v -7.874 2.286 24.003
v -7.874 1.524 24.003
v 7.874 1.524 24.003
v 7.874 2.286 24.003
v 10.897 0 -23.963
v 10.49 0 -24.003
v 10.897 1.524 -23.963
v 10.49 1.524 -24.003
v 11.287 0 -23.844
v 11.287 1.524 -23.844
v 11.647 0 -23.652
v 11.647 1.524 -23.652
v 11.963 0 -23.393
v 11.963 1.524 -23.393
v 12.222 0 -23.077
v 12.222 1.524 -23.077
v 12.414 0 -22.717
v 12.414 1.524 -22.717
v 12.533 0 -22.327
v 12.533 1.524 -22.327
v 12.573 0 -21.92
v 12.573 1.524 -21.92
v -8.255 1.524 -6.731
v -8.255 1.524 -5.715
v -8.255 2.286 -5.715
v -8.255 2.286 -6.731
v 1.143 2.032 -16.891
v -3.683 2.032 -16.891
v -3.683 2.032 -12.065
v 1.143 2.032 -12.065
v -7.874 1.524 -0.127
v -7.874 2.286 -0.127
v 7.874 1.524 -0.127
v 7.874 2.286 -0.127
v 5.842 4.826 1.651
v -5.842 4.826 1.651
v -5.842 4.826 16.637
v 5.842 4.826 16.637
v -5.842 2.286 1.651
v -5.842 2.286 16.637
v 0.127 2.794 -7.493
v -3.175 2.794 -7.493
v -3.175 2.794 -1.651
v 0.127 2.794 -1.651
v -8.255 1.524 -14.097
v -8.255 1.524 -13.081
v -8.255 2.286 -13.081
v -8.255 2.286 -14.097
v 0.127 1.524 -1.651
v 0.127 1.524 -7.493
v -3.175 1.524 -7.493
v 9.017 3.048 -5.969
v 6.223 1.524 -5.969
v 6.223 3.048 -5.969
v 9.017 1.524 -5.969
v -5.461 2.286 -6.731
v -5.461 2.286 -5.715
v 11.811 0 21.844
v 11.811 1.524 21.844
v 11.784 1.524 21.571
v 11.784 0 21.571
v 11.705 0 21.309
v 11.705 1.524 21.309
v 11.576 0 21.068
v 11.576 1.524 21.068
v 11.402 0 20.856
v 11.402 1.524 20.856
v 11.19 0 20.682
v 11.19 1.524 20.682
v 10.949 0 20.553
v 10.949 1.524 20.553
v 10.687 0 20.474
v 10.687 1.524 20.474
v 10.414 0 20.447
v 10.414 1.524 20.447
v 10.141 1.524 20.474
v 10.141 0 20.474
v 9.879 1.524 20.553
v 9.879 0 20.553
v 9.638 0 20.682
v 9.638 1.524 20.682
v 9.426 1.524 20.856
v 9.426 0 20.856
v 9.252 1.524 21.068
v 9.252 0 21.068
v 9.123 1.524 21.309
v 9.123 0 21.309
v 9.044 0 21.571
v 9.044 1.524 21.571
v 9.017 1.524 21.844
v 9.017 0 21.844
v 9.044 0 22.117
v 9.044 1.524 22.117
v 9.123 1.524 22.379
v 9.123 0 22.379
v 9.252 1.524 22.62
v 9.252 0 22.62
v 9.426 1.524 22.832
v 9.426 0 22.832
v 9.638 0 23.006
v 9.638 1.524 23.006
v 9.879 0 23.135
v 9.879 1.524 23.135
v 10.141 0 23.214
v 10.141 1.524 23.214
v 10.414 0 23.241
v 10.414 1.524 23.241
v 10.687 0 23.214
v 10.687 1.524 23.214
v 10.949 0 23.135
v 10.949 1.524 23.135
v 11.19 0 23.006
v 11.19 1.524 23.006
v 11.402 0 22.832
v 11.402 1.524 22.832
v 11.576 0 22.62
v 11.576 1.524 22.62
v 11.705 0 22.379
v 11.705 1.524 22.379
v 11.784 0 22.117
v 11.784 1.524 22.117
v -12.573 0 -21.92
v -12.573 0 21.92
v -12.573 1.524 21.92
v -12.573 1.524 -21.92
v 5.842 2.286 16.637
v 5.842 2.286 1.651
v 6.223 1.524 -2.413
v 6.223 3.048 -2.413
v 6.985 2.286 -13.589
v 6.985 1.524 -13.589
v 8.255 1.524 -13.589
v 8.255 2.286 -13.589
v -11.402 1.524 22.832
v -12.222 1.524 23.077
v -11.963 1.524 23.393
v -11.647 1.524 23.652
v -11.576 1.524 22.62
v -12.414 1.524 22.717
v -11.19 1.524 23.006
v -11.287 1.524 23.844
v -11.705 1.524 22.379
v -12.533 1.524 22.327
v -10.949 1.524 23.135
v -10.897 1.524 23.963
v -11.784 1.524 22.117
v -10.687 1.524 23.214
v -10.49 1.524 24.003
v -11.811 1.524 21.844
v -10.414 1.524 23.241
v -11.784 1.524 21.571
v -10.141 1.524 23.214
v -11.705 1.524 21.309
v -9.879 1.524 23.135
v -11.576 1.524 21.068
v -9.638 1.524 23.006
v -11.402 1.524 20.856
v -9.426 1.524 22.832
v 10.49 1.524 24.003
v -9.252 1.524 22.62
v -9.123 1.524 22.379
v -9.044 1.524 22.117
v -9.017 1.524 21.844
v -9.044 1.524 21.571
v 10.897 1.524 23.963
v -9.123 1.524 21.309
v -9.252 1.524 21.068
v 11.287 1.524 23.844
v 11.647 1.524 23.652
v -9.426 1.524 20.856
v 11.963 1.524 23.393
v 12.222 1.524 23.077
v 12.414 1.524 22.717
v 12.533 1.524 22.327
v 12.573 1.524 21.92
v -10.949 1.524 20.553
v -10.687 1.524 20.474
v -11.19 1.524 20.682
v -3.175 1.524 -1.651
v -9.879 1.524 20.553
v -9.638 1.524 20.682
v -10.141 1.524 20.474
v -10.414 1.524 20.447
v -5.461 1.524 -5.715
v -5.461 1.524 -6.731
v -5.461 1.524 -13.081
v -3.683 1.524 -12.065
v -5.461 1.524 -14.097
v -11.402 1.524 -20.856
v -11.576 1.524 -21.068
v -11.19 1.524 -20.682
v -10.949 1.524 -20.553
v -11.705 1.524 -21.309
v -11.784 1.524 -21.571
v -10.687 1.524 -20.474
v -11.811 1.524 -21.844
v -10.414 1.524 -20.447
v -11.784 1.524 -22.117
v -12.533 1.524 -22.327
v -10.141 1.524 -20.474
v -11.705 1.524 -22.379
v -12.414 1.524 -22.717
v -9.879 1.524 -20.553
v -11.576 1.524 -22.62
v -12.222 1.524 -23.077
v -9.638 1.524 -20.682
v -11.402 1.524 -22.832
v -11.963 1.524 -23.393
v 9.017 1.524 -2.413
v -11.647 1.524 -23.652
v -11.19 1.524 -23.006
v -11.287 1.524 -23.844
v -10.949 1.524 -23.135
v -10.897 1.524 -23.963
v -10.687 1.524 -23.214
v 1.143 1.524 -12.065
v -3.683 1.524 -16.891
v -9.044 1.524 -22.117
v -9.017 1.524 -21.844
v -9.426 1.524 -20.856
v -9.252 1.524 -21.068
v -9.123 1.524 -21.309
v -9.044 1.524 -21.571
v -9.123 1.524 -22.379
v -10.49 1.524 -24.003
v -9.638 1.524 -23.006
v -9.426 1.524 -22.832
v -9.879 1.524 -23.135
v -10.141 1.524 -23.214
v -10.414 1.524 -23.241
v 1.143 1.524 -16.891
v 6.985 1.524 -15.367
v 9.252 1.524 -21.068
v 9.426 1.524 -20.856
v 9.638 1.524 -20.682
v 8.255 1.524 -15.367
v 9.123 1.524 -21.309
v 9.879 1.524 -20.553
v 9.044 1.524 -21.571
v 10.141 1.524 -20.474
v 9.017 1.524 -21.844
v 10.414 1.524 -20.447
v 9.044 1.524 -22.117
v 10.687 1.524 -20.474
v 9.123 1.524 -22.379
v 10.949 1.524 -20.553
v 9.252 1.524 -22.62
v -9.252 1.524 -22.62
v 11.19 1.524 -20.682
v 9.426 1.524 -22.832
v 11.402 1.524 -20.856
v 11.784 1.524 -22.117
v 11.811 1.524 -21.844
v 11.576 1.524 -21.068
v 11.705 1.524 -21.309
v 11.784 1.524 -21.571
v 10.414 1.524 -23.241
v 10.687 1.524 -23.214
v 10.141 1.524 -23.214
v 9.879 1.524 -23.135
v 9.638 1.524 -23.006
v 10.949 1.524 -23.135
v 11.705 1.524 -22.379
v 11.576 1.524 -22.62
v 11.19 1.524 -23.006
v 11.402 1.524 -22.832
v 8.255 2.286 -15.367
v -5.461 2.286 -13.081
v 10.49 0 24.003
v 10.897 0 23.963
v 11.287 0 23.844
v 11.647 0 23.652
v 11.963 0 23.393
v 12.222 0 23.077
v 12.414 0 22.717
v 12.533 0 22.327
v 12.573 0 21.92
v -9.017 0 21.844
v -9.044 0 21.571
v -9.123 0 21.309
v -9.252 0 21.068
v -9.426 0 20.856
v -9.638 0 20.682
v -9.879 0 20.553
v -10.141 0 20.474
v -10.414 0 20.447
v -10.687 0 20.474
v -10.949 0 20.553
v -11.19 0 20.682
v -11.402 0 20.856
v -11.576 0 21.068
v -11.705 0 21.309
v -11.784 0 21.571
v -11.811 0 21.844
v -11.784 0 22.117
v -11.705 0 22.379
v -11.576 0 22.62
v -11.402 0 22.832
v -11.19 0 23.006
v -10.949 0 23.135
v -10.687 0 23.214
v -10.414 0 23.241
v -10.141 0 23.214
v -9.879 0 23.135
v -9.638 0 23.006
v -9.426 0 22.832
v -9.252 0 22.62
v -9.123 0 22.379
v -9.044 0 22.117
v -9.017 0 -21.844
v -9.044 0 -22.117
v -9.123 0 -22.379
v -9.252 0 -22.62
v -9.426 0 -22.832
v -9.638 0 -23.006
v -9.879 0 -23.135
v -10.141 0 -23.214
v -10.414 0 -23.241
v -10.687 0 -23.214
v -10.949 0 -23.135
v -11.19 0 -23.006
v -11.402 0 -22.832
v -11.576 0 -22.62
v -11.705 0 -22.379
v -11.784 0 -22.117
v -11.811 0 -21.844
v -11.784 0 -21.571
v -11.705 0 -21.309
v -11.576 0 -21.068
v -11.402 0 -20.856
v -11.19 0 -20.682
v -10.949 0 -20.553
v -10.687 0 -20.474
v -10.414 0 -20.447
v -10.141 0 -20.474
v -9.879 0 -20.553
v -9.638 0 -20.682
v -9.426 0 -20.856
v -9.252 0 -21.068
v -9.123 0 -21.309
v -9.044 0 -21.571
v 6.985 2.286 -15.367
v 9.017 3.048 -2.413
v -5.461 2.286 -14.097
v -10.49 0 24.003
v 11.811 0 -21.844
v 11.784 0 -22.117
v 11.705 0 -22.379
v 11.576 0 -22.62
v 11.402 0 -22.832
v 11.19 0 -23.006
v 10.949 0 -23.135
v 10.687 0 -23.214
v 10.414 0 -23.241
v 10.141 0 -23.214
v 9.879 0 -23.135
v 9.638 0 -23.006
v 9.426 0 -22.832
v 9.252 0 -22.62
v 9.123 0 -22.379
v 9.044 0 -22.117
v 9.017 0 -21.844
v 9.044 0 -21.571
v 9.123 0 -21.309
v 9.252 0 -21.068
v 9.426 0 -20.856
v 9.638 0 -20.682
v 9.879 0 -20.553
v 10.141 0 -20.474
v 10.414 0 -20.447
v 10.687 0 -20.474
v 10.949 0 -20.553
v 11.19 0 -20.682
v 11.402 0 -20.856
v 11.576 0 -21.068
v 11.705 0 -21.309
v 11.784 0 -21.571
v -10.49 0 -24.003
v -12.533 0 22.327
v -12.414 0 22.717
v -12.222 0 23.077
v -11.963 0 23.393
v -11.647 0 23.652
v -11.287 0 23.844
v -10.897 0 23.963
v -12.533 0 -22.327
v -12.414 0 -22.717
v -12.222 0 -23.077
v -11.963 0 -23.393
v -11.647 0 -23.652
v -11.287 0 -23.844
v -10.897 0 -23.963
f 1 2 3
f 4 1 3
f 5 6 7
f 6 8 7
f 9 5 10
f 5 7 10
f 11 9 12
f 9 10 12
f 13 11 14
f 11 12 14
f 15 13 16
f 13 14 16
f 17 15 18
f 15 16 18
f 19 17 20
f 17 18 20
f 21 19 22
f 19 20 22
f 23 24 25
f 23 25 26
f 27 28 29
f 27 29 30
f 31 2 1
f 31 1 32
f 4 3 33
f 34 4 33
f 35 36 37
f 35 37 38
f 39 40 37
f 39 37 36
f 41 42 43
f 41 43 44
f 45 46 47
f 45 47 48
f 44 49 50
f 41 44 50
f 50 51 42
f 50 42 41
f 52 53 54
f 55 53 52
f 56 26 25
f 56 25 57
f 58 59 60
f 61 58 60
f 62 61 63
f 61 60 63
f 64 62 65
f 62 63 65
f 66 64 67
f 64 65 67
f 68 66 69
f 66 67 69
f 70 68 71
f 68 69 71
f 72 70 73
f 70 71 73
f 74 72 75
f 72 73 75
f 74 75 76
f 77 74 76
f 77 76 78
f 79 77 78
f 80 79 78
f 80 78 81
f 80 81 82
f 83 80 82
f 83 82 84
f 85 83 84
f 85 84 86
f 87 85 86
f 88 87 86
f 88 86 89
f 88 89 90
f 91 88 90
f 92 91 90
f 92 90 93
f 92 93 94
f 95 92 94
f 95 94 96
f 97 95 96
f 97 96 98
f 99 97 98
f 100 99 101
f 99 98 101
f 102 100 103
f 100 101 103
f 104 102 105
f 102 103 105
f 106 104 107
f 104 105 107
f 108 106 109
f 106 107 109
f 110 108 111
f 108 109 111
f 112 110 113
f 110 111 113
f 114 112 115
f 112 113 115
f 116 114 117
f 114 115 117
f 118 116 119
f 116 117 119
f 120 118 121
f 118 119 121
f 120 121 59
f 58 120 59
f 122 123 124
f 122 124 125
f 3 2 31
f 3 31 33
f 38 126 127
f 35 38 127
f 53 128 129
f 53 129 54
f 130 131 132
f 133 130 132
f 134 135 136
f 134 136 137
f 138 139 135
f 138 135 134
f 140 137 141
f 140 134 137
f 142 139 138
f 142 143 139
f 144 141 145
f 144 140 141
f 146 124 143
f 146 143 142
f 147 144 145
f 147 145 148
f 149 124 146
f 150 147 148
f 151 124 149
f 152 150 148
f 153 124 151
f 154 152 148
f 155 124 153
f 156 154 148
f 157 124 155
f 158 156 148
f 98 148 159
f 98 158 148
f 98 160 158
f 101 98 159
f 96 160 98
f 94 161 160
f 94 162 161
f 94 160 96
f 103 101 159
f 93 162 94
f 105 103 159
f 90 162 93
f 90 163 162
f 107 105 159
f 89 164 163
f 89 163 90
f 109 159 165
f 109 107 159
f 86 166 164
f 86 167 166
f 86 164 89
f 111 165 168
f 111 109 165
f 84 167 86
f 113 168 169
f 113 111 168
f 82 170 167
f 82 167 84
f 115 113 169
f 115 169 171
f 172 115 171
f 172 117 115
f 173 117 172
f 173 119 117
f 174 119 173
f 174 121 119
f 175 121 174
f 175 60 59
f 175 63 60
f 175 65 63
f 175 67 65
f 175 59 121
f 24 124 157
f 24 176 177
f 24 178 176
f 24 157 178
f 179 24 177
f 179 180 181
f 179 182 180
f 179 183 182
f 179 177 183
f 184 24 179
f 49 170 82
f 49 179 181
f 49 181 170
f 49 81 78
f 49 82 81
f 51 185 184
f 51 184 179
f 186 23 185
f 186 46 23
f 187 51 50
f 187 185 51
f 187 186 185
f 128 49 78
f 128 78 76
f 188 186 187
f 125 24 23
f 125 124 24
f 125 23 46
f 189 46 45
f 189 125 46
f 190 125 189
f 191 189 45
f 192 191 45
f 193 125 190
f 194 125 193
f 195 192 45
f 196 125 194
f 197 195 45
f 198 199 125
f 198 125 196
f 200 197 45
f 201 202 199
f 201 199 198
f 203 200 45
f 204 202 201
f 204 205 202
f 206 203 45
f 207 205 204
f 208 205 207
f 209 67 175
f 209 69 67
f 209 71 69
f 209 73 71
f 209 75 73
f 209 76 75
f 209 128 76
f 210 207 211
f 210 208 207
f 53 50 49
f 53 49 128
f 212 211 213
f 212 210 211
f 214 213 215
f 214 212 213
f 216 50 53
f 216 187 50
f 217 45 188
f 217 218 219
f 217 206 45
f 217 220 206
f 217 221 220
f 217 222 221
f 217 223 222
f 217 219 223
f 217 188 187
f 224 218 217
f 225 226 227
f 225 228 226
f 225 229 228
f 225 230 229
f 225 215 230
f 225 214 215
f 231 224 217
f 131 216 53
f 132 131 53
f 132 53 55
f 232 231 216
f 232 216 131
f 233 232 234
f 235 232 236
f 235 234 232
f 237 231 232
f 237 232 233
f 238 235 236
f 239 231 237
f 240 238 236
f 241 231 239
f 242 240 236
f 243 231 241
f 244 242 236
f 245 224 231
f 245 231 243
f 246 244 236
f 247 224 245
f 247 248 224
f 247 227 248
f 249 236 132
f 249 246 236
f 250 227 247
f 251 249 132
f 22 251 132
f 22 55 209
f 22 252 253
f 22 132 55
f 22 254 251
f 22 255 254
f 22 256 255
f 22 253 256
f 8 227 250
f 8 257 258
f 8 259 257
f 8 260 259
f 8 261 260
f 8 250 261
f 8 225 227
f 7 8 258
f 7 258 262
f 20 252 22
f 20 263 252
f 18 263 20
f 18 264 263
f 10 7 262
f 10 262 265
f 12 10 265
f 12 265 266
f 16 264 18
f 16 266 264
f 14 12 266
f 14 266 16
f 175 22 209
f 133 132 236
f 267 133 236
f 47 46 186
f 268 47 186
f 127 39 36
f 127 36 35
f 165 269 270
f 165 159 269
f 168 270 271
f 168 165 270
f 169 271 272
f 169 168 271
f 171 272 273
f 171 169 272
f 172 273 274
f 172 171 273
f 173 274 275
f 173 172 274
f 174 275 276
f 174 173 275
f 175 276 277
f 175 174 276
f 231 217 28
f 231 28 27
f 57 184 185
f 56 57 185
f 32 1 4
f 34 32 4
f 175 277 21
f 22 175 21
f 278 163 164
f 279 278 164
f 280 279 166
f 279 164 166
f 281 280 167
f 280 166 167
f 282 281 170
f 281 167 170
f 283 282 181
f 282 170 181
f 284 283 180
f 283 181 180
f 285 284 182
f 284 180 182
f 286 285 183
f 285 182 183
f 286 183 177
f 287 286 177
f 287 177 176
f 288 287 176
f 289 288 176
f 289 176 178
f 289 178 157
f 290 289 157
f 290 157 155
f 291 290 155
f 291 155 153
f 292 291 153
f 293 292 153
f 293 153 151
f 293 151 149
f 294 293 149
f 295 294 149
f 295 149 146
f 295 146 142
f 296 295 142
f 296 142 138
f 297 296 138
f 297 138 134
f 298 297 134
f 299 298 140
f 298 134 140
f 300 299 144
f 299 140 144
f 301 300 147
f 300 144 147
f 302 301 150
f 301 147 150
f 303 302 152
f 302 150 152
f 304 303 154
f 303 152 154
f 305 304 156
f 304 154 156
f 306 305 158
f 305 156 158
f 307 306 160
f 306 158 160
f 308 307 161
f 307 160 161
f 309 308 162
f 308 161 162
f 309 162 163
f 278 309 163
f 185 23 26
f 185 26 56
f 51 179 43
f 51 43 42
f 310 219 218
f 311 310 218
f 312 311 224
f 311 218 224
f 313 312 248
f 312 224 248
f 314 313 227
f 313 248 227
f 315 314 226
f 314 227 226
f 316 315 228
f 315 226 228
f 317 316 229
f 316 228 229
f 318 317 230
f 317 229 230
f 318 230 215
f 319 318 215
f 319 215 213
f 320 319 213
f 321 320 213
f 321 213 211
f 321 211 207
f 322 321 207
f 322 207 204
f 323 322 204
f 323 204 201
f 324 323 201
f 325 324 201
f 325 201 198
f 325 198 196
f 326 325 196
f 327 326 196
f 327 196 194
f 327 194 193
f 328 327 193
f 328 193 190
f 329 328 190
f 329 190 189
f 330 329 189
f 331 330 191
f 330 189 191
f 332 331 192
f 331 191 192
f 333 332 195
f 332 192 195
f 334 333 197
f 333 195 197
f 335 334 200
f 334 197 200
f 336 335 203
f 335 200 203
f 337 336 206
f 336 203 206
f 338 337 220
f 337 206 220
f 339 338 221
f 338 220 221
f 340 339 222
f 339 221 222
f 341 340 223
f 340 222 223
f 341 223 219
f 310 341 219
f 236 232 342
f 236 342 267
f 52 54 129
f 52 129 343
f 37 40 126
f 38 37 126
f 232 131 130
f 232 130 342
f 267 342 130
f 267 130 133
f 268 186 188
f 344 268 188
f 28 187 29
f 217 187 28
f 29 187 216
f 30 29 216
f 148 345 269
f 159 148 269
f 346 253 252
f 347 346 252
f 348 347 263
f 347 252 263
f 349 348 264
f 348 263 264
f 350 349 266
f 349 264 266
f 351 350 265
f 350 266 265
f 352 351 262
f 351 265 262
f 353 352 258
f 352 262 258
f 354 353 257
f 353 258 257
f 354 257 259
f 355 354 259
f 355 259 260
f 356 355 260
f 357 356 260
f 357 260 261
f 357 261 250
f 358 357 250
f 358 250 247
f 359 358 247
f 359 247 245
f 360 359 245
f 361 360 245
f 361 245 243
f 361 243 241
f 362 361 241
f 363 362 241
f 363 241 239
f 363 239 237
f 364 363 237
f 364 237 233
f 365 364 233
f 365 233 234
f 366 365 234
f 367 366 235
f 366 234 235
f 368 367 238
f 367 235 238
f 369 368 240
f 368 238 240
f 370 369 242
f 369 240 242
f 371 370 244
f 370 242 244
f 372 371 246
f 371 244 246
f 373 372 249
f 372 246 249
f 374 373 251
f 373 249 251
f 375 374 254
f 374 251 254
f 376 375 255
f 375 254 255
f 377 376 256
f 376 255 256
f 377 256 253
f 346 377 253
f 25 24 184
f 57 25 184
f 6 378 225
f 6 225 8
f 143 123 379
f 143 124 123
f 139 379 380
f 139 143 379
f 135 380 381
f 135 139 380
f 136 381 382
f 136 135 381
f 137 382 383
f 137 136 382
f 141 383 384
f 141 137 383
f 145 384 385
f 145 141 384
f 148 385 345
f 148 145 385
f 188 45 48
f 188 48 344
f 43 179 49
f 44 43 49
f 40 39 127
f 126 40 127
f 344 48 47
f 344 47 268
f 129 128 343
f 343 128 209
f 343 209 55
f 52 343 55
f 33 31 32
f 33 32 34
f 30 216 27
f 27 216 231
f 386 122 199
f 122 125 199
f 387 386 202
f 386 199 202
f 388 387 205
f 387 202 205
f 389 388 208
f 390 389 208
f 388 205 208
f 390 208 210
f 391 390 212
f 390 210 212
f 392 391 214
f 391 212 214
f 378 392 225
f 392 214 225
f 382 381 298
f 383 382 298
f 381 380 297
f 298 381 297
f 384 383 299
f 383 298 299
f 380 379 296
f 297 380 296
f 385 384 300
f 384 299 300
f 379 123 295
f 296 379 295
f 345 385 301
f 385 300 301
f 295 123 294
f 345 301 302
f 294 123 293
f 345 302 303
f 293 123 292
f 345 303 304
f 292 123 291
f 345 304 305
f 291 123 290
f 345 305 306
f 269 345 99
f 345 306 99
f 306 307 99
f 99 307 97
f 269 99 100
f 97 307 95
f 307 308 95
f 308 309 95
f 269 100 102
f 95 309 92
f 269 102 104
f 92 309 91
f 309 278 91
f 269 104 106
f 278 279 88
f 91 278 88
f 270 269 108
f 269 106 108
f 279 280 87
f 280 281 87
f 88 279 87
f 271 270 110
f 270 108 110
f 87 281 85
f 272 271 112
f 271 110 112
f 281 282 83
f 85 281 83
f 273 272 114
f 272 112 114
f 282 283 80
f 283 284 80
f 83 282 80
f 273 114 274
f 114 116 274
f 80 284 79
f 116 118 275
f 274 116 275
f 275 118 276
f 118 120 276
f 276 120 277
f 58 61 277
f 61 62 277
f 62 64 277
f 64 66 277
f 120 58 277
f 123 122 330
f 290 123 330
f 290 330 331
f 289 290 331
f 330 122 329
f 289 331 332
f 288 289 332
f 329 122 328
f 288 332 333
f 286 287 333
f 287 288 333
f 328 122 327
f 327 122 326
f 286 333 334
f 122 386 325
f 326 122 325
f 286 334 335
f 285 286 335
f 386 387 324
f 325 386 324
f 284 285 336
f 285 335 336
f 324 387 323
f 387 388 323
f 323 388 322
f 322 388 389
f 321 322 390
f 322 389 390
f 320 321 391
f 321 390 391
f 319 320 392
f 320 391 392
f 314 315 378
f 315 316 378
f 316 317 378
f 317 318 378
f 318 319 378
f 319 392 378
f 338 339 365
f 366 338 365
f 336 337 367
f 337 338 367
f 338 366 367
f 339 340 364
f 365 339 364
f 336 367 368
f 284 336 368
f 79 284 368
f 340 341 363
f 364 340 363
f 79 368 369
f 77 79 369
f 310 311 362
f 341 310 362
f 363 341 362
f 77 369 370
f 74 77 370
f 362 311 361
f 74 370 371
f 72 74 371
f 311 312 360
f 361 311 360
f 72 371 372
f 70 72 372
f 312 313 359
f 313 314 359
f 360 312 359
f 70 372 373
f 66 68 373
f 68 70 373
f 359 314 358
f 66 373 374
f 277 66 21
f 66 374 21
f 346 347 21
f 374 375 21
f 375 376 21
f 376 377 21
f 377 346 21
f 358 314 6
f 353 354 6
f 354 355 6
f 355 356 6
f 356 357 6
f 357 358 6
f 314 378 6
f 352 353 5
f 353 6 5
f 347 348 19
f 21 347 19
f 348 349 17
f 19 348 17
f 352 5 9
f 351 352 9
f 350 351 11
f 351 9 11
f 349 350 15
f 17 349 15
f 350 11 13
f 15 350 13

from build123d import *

# Parameters (mm, degrees)
SKETCH1_W           = 25.146
SKETCH1_H           = 48.006
BOSS_EXTRUDE1_DEPTH = 1.524
SKETCH3_W           = 15.748
SKETCH3_H           = 24.13
BOSS_EXTRUDE3_DEPTH = 0.762
SKETCH2_W           = 11.684
SKETCH2_H           = 14.986
BOSS_EXTRUDE2_DEPTH = 2.54
SKETCH6_R           = 1.397
CUT_EXTRUDE1_DEPTH  = 2.524
FILLET1_R           = 2.0828
SKETCH7_W           = 3.302
SKETCH7_H           = 5.842
BOSS_EXTRUDE4_DEPTH = 1.27
SKETCH8_W           = 4.826
SKETCH8_H           = 4.826
BOSS_EXTRUDE5_DEPTH = 0.508
SKETCH9_W           = 2.794
SKETCH9_H           = 3.556
BOSS_EXTRUDE6_DEPTH = 1.524
SKETCH10_W          = 2.794
SKETCH10_H          = 1.016
SKETCH10_W_2        = 1.27
SKETCH10_H_2        = 1.778
BOSS_EXTRUDE7_DEPTH = 0.762


with BuildPart() as part:
    # Sketch1 → Boss-Extrude1 (new body)
    with BuildSketch(Plane(origin=(0, 0, 0), x_dir=(1, 0, 0), z_dir=(0, 1, 0))):
        Rectangle(SKETCH1_W, SKETCH1_H)
    extrude(amount=BOSS_EXTRUDE1_DEPTH)

    # Sketch6 → Cut-Extrude1 (cut, through all)
    with BuildSketch(Plane(origin=(0, 1.524, 0), x_dir=(1, 0, 0), z_dir=(0, 1, 0))):
        with Locations((10.414, 21.844)):
            Circle(SKETCH6_R)
        with Locations((-10.414, 21.844)):
            Circle(SKETCH6_R)
        with Locations((-10.414, -21.844)):
            Circle(SKETCH6_R)
        with Locations((10.414, -21.844)):
            Circle(SKETCH6_R)
    extrude(amount=-CUT_EXTRUDE1_DEPTH, mode=Mode.SUBTRACT)

    # Fillet1
    fillet1_edges = [part.edges().sort_by_distance(p)[0] for p in [
        (12.573, 0.762, 24.003),
        (-12.573, 0.762, 24.003),
        (-12.573, 0.762, -24.003),
        (12.573, 0.762, -24.003),
    ]]
    fillet(fillet1_edges, radius=FILLET1_R)

    # Sketch7 → Boss-Extrude4 (add)
    with BuildSketch(Plane(origin=(0, 1.524, 0), x_dir=(1, 0, 0), z_dir=(0, 1, 0))):
        with Locations((-1.524, 4.572)):
            Rectangle(SKETCH7_W, SKETCH7_H)
    extrude(amount=BOSS_EXTRUDE4_DEPTH)

    # Sketch8 → Boss-Extrude5 (add)
    with BuildSketch(Plane(origin=(0, 1.524, 0), x_dir=(1, 0, 0), z_dir=(0, 1, 0))):
        with Locations((-1.27, 14.478)):
            Rectangle(SKETCH8_W, SKETCH8_H)
    extrude(amount=BOSS_EXTRUDE5_DEPTH)

    # Sketch9 → Boss-Extrude6 (add)
    with BuildSketch(Plane(origin=(0, 1.524, 0), x_dir=(1, 0, 0), z_dir=(0, 1, 0))):
        with Locations((7.62, 4.191)):
            Rectangle(SKETCH9_W, SKETCH9_H)
    extrude(amount=BOSS_EXTRUDE6_DEPTH)

    # Sketch10 → Boss-Extrude7 (add)
    with BuildSketch(Plane(origin=(0, 1.524, 0), x_dir=(1, 0, 0), z_dir=(0, 1, 0))):
        with Locations((-6.858, 6.223)):
            Rectangle(SKETCH10_W, SKETCH10_H)
        with Locations((-6.858, 13.589)):
            Rectangle(SKETCH10_W, SKETCH10_H)
        with Locations((7.62, 14.478)):
            Rectangle(SKETCH10_W_2, SKETCH10_H_2)
    extrude(amount=BOSS_EXTRUDE7_DEPTH)


with BuildPart() as body_2:
    # Sketch3 → Boss-Extrude3 (new body)
    with BuildSketch(Plane(origin=(0, 1.524, 0), x_dir=(1, 0, 0), z_dir=(0, 1, 0))):
        with Locations((0, -11.938)):
            Rectangle(SKETCH3_W, SKETCH3_H)
    extrude(amount=BOSS_EXTRUDE3_DEPTH)


with BuildPart() as body_3:
    # Sketch2 → Boss-Extrude2 (new body)
    with BuildSketch(Plane(origin=(0, 2.286, 0), x_dir=(1, 0, 0), z_dir=(0, 1, 0))):
        with Locations((0, -9.144)):
            Rectangle(SKETCH2_W, SKETCH2_H)
    extrude(amount=BOSS_EXTRUDE2_DEPTH)


solid = Compound([part.part, body_2.part, body_3.part])
